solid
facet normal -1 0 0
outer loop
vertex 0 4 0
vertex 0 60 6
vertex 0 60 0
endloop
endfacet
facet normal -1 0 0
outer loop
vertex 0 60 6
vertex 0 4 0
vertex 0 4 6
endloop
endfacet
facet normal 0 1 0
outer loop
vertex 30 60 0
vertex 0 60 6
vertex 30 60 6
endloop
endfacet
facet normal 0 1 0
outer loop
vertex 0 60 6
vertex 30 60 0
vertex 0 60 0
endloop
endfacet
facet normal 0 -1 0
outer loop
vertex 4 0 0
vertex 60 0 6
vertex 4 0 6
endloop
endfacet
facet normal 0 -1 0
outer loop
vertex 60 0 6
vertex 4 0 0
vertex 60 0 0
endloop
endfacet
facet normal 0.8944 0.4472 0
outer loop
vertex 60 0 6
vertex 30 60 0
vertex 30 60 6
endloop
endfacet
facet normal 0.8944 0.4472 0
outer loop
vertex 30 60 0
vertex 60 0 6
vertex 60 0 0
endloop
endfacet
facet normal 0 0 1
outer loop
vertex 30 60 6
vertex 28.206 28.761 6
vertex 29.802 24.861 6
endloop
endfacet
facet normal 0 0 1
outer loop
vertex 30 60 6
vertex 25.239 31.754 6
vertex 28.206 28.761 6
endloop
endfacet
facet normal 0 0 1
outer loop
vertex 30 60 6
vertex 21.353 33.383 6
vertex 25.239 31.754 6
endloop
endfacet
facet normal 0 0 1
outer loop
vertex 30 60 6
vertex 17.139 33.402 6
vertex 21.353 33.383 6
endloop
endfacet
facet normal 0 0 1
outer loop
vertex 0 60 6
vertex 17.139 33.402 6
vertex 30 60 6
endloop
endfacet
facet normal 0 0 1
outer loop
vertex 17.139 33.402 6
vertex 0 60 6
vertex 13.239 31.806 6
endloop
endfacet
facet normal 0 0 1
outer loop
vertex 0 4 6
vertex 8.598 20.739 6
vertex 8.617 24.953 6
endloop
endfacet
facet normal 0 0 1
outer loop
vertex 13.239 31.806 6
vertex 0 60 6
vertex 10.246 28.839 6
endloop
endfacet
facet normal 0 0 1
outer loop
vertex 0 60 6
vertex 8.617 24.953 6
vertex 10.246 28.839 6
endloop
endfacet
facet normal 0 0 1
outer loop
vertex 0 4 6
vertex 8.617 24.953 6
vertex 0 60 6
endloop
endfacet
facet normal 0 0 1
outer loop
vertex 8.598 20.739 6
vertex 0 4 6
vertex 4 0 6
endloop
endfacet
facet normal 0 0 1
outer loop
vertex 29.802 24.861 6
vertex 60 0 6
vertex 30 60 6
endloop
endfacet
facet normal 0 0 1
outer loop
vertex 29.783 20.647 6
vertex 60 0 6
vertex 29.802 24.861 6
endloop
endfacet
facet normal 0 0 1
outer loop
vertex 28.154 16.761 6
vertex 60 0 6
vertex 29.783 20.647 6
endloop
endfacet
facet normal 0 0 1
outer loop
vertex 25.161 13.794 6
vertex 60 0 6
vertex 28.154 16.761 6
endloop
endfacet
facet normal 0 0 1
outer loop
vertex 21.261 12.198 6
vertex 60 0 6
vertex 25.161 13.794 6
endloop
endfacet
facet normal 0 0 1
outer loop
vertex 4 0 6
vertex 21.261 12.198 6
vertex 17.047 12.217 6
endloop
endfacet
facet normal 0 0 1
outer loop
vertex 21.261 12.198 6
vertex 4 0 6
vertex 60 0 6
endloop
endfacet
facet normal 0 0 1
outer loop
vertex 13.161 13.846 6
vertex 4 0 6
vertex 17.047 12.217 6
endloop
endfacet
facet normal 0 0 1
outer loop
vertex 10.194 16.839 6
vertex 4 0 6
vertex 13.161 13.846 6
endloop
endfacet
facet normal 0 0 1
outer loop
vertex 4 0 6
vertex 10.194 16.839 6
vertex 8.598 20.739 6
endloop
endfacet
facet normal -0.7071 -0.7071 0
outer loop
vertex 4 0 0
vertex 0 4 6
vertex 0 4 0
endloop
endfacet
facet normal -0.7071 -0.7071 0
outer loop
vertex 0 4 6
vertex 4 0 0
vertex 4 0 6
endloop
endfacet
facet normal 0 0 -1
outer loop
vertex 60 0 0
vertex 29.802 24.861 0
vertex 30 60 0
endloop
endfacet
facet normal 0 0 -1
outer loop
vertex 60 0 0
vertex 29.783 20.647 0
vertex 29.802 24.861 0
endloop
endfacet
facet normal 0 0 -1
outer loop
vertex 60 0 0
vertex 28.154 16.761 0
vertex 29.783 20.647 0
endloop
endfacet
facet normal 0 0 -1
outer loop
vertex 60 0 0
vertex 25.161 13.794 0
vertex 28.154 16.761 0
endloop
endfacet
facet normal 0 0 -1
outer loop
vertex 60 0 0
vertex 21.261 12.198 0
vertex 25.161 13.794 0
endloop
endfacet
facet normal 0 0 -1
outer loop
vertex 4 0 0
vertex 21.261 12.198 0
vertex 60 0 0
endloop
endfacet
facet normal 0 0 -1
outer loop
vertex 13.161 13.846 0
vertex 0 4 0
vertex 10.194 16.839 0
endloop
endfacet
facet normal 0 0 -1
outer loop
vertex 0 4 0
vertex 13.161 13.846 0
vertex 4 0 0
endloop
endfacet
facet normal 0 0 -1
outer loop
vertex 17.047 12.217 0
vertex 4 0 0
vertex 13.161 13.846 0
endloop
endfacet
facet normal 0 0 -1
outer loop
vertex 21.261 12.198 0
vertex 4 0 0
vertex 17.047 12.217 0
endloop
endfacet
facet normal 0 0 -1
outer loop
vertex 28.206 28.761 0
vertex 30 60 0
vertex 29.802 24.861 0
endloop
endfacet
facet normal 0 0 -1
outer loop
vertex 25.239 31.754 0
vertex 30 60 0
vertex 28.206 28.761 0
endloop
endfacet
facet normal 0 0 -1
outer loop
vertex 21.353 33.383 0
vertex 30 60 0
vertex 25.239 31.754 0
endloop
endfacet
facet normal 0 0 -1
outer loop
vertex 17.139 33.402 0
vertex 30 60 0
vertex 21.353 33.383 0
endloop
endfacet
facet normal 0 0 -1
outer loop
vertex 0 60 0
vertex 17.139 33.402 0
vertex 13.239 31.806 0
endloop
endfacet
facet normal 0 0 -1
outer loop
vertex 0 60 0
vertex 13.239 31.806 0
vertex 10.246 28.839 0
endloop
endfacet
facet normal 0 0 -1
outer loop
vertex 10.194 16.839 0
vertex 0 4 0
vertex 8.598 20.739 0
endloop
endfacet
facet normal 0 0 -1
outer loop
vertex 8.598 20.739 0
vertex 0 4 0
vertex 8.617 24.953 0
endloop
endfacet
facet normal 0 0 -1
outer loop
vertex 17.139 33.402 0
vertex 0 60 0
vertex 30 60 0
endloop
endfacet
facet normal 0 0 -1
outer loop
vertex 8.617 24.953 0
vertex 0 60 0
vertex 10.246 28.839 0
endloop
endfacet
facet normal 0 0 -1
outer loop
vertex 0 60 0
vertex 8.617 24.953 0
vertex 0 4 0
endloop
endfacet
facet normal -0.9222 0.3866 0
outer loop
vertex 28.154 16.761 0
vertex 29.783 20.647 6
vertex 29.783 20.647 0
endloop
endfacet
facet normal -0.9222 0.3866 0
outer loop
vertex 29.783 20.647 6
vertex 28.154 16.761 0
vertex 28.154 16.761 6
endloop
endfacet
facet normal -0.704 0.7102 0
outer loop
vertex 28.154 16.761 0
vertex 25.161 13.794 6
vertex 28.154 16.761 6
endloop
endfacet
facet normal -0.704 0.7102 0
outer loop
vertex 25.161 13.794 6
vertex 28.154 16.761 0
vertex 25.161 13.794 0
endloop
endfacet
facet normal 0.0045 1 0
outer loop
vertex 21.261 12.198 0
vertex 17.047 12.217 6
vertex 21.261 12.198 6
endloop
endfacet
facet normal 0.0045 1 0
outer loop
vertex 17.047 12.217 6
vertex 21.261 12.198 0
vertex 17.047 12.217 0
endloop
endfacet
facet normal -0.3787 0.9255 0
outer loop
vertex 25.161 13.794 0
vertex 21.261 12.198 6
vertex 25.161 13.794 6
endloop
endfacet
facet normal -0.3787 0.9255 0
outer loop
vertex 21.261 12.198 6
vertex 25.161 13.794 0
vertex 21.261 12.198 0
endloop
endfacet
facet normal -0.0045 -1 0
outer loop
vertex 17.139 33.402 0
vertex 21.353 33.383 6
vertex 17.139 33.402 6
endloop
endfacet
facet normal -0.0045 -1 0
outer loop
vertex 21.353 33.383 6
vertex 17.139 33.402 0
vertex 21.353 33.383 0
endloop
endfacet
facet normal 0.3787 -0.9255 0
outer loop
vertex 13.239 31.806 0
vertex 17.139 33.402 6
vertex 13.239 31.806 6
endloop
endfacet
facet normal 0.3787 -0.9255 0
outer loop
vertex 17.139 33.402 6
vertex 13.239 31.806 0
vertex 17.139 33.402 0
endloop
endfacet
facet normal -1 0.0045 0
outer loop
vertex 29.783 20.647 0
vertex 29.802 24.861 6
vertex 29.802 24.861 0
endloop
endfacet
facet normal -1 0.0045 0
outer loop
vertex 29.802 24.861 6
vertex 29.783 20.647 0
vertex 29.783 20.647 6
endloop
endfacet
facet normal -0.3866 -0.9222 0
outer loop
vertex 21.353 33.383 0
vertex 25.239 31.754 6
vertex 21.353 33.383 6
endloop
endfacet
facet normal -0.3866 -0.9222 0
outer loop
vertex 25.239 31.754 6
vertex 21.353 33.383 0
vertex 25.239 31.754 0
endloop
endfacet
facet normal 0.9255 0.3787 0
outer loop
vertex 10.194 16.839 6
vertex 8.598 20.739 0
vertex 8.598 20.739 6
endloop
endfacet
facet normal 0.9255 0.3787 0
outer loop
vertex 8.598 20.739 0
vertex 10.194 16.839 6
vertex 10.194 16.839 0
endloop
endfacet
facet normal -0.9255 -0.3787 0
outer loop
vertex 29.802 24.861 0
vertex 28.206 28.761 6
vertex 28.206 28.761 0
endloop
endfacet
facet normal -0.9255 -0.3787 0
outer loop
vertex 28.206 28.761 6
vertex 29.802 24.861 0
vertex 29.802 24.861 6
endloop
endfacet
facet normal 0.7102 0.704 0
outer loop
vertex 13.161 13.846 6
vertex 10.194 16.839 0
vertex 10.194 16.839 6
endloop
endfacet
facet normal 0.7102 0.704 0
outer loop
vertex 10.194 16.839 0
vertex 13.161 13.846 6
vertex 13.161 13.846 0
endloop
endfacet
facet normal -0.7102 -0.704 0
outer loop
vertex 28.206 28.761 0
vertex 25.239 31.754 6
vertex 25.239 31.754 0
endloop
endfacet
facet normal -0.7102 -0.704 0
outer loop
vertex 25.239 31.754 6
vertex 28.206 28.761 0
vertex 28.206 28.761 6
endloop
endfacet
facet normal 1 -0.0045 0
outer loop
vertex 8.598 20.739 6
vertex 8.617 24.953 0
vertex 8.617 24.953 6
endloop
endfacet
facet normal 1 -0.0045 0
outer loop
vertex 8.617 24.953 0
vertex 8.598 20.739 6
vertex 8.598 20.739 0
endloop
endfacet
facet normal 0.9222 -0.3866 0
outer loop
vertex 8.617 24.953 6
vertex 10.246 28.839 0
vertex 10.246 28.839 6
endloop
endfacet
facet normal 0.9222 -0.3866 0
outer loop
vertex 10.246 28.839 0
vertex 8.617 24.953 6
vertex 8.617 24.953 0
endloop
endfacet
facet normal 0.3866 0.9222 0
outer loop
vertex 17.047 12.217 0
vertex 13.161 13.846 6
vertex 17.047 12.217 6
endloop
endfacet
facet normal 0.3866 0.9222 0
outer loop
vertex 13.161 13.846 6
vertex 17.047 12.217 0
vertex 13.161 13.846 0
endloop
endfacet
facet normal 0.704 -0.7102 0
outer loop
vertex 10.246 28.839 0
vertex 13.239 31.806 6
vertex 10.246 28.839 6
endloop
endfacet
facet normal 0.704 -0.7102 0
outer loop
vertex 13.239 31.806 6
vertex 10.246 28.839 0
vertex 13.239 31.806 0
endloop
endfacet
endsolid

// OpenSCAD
$fn = 32;

// ----------------------------------------------------------------------
// Bracket plate: gusset 60 x 60
// ----------------------------------------------------------------------

// --- parameters (mm) ---
hole_r = 4;               // bolt hole radius
plate_t = 6;              // plate thickness, Z (extrusion height)
gus_a = 60;               // base length
gus_b = 60;               // height
top_x = 30;               // top edge X of the angled cut
light_r = 10.8;           // lightening hole radius
fit_tol = 0.02;           // declared fit tolerance (prompt contract)
free_tol = 0.2;           // declared free tolerance (prompt contract)

light_d = 2 * light_r;

profile = [[4, 0], [30, 0], [60, 0], [30, 60], [0, 60], [0, 4]];  // primary outline, 6 points, counter clockwise
void_1 = [[29.802, 24.861], [28.206, 28.761], [25.239, 31.754], [21.353, 33.383], [17.139, 33.402], [13.239, 31.806], [10.246, 28.839], [8.617, 24.953], [8.598, 20.739], [10.194, 16.839], [13.161, 13.846], [17.047, 12.217], [21.261, 12.198], [25.161, 13.794], [28.154, 16.761], [29.783, 20.647]];  // lightening hole, 16 points

// --- the one profile operation ---
difference() {
  linear_extrude(height = plate_t) polygon(points = profile);
  translate([0, 0, -1])
    linear_extrude(height = plate_t + 2) polygon(points = void_1);
}
